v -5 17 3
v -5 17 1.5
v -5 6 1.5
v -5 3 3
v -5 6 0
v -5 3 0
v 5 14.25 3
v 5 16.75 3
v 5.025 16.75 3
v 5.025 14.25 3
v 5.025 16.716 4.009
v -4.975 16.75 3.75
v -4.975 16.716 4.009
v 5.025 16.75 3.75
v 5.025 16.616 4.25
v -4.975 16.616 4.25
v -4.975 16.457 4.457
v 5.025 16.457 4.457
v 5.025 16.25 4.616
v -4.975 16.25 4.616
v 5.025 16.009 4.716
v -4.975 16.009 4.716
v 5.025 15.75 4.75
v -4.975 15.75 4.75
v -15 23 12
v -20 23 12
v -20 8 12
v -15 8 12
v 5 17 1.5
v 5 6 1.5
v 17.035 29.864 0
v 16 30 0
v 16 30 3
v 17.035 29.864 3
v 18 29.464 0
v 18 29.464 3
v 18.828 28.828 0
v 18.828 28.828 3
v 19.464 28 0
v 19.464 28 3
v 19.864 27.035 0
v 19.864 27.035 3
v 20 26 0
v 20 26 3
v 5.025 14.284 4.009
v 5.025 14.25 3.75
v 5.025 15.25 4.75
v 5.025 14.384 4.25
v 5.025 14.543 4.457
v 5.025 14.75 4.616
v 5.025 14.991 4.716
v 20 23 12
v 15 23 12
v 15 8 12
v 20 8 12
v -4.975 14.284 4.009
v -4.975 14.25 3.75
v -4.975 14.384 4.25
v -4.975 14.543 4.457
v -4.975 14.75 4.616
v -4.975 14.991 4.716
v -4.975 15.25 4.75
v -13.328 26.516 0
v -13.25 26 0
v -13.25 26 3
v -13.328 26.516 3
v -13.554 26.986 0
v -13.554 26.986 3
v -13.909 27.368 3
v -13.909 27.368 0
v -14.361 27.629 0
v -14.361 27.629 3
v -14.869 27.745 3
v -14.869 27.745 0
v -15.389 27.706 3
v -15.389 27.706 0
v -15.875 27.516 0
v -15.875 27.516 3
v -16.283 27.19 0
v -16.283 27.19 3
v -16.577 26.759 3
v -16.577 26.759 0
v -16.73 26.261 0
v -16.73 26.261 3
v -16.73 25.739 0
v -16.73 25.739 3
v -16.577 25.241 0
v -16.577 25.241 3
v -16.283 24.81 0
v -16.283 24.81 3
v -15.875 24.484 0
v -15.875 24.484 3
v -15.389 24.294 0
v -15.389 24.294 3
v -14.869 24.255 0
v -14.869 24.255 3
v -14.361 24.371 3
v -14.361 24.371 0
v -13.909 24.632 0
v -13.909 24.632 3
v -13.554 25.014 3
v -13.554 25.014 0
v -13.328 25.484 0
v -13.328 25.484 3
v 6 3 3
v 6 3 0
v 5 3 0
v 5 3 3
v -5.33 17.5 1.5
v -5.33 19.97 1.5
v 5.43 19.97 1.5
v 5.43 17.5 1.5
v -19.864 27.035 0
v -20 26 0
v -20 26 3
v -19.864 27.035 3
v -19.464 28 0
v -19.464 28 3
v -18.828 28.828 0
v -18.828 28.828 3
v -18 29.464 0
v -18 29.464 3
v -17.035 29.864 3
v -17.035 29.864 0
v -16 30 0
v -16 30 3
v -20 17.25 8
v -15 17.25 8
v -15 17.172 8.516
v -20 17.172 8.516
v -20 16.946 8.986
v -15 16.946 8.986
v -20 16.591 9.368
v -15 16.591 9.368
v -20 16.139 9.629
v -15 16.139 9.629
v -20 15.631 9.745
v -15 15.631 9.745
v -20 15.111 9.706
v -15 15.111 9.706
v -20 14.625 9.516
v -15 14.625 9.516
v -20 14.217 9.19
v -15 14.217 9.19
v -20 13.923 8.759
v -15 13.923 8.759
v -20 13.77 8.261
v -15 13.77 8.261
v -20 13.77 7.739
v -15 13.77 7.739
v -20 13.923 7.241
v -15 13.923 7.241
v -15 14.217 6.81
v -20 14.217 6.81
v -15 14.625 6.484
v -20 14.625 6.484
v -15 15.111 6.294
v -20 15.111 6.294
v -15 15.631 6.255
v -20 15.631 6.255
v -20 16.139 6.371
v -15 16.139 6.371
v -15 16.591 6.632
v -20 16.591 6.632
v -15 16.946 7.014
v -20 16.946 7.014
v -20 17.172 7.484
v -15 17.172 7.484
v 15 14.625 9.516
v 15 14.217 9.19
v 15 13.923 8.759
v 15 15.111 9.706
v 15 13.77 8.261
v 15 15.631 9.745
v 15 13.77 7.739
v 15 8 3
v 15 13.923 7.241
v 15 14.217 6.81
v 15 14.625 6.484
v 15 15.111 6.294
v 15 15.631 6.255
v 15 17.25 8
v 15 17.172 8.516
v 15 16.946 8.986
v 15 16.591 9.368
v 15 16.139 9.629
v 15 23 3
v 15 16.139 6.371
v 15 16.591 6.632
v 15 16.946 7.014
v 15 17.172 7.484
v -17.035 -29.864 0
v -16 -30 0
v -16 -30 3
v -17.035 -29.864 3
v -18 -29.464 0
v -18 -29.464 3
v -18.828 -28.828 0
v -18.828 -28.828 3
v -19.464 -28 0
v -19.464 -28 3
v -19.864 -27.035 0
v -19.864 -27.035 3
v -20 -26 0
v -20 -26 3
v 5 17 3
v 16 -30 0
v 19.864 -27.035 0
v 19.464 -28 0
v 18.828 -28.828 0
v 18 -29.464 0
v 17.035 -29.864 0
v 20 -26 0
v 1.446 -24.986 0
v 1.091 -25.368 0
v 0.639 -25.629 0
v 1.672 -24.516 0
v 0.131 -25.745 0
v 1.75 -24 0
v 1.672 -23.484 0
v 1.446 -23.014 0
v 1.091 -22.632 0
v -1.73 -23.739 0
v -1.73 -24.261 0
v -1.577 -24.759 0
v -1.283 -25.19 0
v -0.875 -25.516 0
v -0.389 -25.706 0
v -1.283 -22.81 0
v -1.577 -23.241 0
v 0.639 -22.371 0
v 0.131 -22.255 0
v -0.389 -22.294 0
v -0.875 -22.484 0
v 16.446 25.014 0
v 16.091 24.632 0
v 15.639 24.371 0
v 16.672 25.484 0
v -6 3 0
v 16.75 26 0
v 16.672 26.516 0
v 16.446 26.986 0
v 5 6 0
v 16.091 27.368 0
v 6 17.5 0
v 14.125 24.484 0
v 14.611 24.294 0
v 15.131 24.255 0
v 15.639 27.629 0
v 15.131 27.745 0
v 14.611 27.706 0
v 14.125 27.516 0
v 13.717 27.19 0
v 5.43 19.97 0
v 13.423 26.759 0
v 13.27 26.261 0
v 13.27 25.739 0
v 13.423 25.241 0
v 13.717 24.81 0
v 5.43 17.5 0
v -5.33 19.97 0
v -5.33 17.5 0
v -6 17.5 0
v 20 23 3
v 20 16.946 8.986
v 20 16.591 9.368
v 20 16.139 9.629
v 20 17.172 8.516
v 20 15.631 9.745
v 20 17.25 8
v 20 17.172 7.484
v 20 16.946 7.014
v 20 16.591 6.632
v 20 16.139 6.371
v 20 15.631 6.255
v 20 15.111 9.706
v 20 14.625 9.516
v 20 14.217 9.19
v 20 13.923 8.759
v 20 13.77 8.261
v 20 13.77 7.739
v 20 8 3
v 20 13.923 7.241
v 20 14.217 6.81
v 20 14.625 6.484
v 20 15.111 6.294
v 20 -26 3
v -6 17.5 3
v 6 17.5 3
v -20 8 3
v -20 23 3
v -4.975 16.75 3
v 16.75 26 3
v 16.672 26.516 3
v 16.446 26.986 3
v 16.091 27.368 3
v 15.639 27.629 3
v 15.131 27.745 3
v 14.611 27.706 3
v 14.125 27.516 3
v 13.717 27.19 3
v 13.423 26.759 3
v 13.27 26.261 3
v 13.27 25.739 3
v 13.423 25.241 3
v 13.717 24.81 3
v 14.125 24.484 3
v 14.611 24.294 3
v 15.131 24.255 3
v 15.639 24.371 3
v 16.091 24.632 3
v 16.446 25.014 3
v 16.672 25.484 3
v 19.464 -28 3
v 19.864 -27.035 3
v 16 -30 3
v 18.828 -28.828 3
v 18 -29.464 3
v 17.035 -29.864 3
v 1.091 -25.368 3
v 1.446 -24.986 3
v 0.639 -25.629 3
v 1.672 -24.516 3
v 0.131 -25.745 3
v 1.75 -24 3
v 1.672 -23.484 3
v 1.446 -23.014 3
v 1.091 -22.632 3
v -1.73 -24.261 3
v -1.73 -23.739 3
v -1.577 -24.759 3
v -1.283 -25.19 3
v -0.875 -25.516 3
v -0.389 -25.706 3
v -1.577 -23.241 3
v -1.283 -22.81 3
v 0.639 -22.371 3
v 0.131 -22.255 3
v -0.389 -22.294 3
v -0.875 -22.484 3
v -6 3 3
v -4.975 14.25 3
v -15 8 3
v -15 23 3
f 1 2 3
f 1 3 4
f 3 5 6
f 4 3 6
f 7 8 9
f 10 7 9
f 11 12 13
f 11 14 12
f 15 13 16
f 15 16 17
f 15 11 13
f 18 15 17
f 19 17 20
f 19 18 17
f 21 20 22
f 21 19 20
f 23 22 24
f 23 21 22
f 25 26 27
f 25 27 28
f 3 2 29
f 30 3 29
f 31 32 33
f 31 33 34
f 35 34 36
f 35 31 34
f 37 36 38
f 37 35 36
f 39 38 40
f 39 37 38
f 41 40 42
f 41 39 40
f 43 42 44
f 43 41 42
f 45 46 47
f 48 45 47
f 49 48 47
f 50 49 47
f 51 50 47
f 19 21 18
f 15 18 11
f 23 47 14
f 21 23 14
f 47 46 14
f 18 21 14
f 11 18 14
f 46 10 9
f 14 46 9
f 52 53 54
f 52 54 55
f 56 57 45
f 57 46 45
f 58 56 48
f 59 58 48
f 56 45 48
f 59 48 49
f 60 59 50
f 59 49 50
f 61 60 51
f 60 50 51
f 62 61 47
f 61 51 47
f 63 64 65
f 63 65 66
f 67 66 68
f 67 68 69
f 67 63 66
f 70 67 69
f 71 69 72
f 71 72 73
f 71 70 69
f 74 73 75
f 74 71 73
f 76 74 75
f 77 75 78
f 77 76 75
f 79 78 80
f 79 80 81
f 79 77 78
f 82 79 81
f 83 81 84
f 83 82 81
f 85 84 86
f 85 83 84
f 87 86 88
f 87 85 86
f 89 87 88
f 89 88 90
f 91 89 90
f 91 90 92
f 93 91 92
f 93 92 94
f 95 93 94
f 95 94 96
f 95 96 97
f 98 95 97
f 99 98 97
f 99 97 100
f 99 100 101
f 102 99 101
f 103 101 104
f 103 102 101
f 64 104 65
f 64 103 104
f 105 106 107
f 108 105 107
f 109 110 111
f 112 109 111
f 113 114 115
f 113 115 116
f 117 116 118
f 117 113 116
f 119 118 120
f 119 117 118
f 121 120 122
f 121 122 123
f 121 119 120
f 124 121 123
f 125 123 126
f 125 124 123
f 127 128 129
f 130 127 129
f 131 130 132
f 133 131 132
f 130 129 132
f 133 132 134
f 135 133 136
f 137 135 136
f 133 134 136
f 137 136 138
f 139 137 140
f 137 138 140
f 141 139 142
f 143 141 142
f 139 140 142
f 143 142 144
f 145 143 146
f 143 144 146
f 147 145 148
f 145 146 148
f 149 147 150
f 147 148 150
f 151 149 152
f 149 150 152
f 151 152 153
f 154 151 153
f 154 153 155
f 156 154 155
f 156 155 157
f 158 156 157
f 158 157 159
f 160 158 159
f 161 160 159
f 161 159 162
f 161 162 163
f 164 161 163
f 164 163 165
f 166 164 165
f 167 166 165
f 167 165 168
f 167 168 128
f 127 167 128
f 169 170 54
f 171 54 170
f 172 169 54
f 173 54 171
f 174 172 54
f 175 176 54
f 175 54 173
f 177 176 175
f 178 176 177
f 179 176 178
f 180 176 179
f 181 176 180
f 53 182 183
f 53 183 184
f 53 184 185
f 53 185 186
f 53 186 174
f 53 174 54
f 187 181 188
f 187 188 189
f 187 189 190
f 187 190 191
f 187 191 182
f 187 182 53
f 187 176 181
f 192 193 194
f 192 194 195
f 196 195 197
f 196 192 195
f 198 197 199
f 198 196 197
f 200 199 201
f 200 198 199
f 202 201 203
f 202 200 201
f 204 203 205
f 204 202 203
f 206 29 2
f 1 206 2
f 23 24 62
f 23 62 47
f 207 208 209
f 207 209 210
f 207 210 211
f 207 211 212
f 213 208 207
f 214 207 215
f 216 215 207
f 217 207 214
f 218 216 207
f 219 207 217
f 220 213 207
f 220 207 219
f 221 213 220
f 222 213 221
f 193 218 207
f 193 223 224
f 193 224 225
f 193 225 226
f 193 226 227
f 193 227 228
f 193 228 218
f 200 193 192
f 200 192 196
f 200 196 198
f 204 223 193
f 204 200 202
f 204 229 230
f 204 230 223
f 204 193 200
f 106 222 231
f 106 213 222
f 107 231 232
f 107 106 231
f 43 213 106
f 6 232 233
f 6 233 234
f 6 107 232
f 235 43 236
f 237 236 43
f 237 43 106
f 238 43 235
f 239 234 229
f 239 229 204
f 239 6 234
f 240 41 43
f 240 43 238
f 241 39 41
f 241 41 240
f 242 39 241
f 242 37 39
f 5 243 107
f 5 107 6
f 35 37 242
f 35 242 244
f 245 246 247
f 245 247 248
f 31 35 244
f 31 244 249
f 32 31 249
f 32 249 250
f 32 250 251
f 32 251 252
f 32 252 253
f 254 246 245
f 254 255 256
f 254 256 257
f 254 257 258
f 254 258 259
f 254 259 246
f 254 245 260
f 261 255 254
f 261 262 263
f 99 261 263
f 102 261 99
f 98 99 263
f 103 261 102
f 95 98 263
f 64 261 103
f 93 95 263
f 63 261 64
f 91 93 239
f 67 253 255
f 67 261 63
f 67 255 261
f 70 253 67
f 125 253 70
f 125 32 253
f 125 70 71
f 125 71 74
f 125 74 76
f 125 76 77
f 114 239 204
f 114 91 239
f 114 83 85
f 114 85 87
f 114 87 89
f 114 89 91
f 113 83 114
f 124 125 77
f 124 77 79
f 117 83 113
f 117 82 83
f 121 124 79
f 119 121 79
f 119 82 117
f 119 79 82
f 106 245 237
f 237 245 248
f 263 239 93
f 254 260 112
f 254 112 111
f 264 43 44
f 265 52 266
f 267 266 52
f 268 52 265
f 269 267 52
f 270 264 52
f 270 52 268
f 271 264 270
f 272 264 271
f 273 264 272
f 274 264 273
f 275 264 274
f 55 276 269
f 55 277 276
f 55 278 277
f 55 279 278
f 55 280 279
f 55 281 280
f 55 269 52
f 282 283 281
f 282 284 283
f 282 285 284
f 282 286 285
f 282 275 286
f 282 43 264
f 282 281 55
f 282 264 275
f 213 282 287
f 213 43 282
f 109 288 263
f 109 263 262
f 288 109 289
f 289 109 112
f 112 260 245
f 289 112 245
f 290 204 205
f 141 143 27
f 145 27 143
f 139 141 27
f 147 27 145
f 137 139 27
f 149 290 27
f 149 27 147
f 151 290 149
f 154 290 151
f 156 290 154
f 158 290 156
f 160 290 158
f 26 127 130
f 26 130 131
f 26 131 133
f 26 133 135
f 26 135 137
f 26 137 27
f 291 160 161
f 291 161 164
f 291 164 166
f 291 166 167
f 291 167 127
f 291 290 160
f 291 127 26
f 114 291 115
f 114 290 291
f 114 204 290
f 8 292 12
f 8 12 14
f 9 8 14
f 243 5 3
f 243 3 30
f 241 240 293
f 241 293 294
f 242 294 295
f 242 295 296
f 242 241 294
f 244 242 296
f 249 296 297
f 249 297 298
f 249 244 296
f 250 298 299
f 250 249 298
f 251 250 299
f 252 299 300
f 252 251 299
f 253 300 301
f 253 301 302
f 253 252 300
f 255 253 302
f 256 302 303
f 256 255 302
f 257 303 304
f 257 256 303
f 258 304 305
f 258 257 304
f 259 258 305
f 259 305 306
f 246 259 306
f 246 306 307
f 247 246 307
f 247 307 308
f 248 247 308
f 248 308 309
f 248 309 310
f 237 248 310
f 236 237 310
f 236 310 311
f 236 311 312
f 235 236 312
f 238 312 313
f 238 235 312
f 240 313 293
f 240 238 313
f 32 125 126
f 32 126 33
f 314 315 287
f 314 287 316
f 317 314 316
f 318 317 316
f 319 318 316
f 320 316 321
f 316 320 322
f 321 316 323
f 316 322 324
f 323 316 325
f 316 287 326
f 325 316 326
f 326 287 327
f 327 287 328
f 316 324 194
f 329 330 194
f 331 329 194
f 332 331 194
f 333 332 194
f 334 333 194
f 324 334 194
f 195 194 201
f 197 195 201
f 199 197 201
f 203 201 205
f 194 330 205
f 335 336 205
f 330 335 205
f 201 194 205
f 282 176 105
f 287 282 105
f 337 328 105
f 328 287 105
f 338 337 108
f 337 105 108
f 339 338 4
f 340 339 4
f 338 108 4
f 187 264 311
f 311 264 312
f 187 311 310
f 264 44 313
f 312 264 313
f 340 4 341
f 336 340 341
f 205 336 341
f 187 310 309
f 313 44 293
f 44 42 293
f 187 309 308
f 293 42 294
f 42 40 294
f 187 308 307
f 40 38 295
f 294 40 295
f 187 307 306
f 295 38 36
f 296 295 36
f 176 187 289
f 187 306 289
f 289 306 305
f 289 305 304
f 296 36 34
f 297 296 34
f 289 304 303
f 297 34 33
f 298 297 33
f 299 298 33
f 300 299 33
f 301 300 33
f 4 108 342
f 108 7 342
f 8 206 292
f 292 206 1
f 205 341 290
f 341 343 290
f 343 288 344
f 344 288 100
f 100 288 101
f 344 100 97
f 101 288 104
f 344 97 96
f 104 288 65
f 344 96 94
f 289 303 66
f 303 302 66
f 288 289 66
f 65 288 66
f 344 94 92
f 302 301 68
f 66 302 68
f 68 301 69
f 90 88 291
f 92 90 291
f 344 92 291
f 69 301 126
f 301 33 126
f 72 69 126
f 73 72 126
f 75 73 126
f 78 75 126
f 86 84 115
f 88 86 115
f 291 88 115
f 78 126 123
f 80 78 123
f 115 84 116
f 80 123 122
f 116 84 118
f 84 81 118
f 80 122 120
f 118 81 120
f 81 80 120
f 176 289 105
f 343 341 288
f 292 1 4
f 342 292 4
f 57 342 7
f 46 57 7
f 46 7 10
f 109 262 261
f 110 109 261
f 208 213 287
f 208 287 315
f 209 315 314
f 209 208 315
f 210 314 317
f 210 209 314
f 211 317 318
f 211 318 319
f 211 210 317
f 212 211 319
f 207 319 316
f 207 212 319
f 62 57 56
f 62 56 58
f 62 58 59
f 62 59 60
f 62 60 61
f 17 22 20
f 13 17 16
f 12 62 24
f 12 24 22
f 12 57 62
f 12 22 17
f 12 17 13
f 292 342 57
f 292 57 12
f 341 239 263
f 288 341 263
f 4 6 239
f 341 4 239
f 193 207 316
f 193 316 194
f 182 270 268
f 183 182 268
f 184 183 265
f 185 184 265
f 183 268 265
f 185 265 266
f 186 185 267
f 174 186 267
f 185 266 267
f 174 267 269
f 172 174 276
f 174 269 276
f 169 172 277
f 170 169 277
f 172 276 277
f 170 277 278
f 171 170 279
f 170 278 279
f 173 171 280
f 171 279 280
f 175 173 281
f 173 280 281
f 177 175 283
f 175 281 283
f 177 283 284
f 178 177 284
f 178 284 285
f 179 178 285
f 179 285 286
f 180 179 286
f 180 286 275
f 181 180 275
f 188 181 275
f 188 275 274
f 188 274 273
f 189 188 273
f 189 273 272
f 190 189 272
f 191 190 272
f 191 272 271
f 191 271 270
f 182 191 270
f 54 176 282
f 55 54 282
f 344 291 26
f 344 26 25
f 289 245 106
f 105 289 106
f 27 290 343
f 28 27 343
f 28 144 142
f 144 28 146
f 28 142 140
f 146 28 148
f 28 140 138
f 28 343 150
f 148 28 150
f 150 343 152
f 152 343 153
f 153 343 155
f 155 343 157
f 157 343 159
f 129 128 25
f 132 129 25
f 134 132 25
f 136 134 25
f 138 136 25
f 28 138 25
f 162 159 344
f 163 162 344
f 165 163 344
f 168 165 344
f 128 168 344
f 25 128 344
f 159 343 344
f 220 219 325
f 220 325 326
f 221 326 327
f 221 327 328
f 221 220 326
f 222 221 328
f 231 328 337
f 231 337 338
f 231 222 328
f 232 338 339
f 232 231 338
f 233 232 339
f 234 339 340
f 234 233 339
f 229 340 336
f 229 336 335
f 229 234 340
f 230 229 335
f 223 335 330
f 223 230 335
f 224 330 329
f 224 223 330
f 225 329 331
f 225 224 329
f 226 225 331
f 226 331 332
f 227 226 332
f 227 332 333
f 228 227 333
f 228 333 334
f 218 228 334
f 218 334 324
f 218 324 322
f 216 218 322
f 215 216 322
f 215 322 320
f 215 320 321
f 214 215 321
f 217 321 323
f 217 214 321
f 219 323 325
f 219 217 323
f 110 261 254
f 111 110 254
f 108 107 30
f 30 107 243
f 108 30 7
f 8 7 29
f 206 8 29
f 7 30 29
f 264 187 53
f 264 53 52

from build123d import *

# Parameters (mm, degrees)
SKETCH_R        = 1.75
PAD_DEPTH       = 3
SKETCH001_W     = 10.76
SKETCH001_H     = 13.97
POCKET_DEPTH    = 1.5
SKETCH002_W     = 5
SKETCH002_H     = 15
PAD001_DEPTH    = 9
SKETCH003_R     = 1.75
POCKET001_DEPTH = 50
SKETCH004_W     = 10
SKETCH004_H     = 2.5
PAD002_DEPTH    = 1.75
FILLET_R        = 1


with BuildPart() as part:
    # Sketch → Pad (new body)
    with BuildSketch(Plane.XY):
        with BuildLine():
            Line((-20, -26), (-20, 26))
            ThreePointArc((-20, 26), (-18.828427, 28.828427), (-16, 30))
            Line((-16, 30), (16, 30))
            ThreePointArc((16, 30), (18.828427, 28.828427), (20, 26))
            Line((20, 26), (20, -26))
            ThreePointArc((20, -26), (18.828427, -28.828427), (16, -30))
            Line((16, -30), (-16, -30))
            ThreePointArc((-16, -30), (-18.828427, -28.828427), (-20, -26))
        make_face()
        Polygon((6, 3), (5, 3), (5, 17), (-5, 17), (-5, 3), (-6, 3), (-6, 17.5), (6, 17.5), align=None, mode=Mode.SUBTRACT)
        with Locations((-15, 26)):
            Circle(SKETCH_R, mode=Mode.SUBTRACT)
        with Locations((15, 26)):
            Circle(SKETCH_R, mode=Mode.SUBTRACT)
        with Locations((0, -24)):
            Circle(SKETCH_R, mode=Mode.SUBTRACT)
    extrude(amount=PAD_DEPTH)

    # Sketch001 → Pocket (cut)
    with BuildSketch(Plane.XY):
        with Locations((0.05, 12.985)):
            Rectangle(SKETCH001_W, SKETCH001_H)
    extrude(amount=POCKET_DEPTH, mode=Mode.SUBTRACT)

    # Sketch002 → Pad001 (join)
    with BuildSketch(Plane.XY.offset(3)):
        with Locations((17.5, 15.5)):
            Rectangle(SKETCH002_W, SKETCH002_H)
        with Locations((-17.5, 15.5)):
            Rectangle(SKETCH002_W, SKETCH002_H)
    extrude(amount=PAD001_DEPTH)

    # Sketch003 → Pocket001 (cut)
    with BuildSketch(Plane.YZ.offset(20)):
        with Locations((15.5, 8)):
            Circle(SKETCH003_R)
    extrude(amount=-POCKET001_DEPTH, mode=Mode.SUBTRACT)

    # Sketch004 → Pad002 (join)
    with BuildSketch(Plane.XY.offset(3)):
        with Locations((0.024575, 15.5)):
            Rectangle(SKETCH004_W, SKETCH004_H)
    extrude(amount=PAD002_DEPTH)

    # Fillet
    fillet_edges = [part.edges().sort_by_distance(p)[0] for p in [
        (0.024575, 14.25, 4.75),
        (0.024575, 16.75, 4.75),
    ]]
    fillet(fillet_edges, radius=FILLET_R)


solid = part.part
